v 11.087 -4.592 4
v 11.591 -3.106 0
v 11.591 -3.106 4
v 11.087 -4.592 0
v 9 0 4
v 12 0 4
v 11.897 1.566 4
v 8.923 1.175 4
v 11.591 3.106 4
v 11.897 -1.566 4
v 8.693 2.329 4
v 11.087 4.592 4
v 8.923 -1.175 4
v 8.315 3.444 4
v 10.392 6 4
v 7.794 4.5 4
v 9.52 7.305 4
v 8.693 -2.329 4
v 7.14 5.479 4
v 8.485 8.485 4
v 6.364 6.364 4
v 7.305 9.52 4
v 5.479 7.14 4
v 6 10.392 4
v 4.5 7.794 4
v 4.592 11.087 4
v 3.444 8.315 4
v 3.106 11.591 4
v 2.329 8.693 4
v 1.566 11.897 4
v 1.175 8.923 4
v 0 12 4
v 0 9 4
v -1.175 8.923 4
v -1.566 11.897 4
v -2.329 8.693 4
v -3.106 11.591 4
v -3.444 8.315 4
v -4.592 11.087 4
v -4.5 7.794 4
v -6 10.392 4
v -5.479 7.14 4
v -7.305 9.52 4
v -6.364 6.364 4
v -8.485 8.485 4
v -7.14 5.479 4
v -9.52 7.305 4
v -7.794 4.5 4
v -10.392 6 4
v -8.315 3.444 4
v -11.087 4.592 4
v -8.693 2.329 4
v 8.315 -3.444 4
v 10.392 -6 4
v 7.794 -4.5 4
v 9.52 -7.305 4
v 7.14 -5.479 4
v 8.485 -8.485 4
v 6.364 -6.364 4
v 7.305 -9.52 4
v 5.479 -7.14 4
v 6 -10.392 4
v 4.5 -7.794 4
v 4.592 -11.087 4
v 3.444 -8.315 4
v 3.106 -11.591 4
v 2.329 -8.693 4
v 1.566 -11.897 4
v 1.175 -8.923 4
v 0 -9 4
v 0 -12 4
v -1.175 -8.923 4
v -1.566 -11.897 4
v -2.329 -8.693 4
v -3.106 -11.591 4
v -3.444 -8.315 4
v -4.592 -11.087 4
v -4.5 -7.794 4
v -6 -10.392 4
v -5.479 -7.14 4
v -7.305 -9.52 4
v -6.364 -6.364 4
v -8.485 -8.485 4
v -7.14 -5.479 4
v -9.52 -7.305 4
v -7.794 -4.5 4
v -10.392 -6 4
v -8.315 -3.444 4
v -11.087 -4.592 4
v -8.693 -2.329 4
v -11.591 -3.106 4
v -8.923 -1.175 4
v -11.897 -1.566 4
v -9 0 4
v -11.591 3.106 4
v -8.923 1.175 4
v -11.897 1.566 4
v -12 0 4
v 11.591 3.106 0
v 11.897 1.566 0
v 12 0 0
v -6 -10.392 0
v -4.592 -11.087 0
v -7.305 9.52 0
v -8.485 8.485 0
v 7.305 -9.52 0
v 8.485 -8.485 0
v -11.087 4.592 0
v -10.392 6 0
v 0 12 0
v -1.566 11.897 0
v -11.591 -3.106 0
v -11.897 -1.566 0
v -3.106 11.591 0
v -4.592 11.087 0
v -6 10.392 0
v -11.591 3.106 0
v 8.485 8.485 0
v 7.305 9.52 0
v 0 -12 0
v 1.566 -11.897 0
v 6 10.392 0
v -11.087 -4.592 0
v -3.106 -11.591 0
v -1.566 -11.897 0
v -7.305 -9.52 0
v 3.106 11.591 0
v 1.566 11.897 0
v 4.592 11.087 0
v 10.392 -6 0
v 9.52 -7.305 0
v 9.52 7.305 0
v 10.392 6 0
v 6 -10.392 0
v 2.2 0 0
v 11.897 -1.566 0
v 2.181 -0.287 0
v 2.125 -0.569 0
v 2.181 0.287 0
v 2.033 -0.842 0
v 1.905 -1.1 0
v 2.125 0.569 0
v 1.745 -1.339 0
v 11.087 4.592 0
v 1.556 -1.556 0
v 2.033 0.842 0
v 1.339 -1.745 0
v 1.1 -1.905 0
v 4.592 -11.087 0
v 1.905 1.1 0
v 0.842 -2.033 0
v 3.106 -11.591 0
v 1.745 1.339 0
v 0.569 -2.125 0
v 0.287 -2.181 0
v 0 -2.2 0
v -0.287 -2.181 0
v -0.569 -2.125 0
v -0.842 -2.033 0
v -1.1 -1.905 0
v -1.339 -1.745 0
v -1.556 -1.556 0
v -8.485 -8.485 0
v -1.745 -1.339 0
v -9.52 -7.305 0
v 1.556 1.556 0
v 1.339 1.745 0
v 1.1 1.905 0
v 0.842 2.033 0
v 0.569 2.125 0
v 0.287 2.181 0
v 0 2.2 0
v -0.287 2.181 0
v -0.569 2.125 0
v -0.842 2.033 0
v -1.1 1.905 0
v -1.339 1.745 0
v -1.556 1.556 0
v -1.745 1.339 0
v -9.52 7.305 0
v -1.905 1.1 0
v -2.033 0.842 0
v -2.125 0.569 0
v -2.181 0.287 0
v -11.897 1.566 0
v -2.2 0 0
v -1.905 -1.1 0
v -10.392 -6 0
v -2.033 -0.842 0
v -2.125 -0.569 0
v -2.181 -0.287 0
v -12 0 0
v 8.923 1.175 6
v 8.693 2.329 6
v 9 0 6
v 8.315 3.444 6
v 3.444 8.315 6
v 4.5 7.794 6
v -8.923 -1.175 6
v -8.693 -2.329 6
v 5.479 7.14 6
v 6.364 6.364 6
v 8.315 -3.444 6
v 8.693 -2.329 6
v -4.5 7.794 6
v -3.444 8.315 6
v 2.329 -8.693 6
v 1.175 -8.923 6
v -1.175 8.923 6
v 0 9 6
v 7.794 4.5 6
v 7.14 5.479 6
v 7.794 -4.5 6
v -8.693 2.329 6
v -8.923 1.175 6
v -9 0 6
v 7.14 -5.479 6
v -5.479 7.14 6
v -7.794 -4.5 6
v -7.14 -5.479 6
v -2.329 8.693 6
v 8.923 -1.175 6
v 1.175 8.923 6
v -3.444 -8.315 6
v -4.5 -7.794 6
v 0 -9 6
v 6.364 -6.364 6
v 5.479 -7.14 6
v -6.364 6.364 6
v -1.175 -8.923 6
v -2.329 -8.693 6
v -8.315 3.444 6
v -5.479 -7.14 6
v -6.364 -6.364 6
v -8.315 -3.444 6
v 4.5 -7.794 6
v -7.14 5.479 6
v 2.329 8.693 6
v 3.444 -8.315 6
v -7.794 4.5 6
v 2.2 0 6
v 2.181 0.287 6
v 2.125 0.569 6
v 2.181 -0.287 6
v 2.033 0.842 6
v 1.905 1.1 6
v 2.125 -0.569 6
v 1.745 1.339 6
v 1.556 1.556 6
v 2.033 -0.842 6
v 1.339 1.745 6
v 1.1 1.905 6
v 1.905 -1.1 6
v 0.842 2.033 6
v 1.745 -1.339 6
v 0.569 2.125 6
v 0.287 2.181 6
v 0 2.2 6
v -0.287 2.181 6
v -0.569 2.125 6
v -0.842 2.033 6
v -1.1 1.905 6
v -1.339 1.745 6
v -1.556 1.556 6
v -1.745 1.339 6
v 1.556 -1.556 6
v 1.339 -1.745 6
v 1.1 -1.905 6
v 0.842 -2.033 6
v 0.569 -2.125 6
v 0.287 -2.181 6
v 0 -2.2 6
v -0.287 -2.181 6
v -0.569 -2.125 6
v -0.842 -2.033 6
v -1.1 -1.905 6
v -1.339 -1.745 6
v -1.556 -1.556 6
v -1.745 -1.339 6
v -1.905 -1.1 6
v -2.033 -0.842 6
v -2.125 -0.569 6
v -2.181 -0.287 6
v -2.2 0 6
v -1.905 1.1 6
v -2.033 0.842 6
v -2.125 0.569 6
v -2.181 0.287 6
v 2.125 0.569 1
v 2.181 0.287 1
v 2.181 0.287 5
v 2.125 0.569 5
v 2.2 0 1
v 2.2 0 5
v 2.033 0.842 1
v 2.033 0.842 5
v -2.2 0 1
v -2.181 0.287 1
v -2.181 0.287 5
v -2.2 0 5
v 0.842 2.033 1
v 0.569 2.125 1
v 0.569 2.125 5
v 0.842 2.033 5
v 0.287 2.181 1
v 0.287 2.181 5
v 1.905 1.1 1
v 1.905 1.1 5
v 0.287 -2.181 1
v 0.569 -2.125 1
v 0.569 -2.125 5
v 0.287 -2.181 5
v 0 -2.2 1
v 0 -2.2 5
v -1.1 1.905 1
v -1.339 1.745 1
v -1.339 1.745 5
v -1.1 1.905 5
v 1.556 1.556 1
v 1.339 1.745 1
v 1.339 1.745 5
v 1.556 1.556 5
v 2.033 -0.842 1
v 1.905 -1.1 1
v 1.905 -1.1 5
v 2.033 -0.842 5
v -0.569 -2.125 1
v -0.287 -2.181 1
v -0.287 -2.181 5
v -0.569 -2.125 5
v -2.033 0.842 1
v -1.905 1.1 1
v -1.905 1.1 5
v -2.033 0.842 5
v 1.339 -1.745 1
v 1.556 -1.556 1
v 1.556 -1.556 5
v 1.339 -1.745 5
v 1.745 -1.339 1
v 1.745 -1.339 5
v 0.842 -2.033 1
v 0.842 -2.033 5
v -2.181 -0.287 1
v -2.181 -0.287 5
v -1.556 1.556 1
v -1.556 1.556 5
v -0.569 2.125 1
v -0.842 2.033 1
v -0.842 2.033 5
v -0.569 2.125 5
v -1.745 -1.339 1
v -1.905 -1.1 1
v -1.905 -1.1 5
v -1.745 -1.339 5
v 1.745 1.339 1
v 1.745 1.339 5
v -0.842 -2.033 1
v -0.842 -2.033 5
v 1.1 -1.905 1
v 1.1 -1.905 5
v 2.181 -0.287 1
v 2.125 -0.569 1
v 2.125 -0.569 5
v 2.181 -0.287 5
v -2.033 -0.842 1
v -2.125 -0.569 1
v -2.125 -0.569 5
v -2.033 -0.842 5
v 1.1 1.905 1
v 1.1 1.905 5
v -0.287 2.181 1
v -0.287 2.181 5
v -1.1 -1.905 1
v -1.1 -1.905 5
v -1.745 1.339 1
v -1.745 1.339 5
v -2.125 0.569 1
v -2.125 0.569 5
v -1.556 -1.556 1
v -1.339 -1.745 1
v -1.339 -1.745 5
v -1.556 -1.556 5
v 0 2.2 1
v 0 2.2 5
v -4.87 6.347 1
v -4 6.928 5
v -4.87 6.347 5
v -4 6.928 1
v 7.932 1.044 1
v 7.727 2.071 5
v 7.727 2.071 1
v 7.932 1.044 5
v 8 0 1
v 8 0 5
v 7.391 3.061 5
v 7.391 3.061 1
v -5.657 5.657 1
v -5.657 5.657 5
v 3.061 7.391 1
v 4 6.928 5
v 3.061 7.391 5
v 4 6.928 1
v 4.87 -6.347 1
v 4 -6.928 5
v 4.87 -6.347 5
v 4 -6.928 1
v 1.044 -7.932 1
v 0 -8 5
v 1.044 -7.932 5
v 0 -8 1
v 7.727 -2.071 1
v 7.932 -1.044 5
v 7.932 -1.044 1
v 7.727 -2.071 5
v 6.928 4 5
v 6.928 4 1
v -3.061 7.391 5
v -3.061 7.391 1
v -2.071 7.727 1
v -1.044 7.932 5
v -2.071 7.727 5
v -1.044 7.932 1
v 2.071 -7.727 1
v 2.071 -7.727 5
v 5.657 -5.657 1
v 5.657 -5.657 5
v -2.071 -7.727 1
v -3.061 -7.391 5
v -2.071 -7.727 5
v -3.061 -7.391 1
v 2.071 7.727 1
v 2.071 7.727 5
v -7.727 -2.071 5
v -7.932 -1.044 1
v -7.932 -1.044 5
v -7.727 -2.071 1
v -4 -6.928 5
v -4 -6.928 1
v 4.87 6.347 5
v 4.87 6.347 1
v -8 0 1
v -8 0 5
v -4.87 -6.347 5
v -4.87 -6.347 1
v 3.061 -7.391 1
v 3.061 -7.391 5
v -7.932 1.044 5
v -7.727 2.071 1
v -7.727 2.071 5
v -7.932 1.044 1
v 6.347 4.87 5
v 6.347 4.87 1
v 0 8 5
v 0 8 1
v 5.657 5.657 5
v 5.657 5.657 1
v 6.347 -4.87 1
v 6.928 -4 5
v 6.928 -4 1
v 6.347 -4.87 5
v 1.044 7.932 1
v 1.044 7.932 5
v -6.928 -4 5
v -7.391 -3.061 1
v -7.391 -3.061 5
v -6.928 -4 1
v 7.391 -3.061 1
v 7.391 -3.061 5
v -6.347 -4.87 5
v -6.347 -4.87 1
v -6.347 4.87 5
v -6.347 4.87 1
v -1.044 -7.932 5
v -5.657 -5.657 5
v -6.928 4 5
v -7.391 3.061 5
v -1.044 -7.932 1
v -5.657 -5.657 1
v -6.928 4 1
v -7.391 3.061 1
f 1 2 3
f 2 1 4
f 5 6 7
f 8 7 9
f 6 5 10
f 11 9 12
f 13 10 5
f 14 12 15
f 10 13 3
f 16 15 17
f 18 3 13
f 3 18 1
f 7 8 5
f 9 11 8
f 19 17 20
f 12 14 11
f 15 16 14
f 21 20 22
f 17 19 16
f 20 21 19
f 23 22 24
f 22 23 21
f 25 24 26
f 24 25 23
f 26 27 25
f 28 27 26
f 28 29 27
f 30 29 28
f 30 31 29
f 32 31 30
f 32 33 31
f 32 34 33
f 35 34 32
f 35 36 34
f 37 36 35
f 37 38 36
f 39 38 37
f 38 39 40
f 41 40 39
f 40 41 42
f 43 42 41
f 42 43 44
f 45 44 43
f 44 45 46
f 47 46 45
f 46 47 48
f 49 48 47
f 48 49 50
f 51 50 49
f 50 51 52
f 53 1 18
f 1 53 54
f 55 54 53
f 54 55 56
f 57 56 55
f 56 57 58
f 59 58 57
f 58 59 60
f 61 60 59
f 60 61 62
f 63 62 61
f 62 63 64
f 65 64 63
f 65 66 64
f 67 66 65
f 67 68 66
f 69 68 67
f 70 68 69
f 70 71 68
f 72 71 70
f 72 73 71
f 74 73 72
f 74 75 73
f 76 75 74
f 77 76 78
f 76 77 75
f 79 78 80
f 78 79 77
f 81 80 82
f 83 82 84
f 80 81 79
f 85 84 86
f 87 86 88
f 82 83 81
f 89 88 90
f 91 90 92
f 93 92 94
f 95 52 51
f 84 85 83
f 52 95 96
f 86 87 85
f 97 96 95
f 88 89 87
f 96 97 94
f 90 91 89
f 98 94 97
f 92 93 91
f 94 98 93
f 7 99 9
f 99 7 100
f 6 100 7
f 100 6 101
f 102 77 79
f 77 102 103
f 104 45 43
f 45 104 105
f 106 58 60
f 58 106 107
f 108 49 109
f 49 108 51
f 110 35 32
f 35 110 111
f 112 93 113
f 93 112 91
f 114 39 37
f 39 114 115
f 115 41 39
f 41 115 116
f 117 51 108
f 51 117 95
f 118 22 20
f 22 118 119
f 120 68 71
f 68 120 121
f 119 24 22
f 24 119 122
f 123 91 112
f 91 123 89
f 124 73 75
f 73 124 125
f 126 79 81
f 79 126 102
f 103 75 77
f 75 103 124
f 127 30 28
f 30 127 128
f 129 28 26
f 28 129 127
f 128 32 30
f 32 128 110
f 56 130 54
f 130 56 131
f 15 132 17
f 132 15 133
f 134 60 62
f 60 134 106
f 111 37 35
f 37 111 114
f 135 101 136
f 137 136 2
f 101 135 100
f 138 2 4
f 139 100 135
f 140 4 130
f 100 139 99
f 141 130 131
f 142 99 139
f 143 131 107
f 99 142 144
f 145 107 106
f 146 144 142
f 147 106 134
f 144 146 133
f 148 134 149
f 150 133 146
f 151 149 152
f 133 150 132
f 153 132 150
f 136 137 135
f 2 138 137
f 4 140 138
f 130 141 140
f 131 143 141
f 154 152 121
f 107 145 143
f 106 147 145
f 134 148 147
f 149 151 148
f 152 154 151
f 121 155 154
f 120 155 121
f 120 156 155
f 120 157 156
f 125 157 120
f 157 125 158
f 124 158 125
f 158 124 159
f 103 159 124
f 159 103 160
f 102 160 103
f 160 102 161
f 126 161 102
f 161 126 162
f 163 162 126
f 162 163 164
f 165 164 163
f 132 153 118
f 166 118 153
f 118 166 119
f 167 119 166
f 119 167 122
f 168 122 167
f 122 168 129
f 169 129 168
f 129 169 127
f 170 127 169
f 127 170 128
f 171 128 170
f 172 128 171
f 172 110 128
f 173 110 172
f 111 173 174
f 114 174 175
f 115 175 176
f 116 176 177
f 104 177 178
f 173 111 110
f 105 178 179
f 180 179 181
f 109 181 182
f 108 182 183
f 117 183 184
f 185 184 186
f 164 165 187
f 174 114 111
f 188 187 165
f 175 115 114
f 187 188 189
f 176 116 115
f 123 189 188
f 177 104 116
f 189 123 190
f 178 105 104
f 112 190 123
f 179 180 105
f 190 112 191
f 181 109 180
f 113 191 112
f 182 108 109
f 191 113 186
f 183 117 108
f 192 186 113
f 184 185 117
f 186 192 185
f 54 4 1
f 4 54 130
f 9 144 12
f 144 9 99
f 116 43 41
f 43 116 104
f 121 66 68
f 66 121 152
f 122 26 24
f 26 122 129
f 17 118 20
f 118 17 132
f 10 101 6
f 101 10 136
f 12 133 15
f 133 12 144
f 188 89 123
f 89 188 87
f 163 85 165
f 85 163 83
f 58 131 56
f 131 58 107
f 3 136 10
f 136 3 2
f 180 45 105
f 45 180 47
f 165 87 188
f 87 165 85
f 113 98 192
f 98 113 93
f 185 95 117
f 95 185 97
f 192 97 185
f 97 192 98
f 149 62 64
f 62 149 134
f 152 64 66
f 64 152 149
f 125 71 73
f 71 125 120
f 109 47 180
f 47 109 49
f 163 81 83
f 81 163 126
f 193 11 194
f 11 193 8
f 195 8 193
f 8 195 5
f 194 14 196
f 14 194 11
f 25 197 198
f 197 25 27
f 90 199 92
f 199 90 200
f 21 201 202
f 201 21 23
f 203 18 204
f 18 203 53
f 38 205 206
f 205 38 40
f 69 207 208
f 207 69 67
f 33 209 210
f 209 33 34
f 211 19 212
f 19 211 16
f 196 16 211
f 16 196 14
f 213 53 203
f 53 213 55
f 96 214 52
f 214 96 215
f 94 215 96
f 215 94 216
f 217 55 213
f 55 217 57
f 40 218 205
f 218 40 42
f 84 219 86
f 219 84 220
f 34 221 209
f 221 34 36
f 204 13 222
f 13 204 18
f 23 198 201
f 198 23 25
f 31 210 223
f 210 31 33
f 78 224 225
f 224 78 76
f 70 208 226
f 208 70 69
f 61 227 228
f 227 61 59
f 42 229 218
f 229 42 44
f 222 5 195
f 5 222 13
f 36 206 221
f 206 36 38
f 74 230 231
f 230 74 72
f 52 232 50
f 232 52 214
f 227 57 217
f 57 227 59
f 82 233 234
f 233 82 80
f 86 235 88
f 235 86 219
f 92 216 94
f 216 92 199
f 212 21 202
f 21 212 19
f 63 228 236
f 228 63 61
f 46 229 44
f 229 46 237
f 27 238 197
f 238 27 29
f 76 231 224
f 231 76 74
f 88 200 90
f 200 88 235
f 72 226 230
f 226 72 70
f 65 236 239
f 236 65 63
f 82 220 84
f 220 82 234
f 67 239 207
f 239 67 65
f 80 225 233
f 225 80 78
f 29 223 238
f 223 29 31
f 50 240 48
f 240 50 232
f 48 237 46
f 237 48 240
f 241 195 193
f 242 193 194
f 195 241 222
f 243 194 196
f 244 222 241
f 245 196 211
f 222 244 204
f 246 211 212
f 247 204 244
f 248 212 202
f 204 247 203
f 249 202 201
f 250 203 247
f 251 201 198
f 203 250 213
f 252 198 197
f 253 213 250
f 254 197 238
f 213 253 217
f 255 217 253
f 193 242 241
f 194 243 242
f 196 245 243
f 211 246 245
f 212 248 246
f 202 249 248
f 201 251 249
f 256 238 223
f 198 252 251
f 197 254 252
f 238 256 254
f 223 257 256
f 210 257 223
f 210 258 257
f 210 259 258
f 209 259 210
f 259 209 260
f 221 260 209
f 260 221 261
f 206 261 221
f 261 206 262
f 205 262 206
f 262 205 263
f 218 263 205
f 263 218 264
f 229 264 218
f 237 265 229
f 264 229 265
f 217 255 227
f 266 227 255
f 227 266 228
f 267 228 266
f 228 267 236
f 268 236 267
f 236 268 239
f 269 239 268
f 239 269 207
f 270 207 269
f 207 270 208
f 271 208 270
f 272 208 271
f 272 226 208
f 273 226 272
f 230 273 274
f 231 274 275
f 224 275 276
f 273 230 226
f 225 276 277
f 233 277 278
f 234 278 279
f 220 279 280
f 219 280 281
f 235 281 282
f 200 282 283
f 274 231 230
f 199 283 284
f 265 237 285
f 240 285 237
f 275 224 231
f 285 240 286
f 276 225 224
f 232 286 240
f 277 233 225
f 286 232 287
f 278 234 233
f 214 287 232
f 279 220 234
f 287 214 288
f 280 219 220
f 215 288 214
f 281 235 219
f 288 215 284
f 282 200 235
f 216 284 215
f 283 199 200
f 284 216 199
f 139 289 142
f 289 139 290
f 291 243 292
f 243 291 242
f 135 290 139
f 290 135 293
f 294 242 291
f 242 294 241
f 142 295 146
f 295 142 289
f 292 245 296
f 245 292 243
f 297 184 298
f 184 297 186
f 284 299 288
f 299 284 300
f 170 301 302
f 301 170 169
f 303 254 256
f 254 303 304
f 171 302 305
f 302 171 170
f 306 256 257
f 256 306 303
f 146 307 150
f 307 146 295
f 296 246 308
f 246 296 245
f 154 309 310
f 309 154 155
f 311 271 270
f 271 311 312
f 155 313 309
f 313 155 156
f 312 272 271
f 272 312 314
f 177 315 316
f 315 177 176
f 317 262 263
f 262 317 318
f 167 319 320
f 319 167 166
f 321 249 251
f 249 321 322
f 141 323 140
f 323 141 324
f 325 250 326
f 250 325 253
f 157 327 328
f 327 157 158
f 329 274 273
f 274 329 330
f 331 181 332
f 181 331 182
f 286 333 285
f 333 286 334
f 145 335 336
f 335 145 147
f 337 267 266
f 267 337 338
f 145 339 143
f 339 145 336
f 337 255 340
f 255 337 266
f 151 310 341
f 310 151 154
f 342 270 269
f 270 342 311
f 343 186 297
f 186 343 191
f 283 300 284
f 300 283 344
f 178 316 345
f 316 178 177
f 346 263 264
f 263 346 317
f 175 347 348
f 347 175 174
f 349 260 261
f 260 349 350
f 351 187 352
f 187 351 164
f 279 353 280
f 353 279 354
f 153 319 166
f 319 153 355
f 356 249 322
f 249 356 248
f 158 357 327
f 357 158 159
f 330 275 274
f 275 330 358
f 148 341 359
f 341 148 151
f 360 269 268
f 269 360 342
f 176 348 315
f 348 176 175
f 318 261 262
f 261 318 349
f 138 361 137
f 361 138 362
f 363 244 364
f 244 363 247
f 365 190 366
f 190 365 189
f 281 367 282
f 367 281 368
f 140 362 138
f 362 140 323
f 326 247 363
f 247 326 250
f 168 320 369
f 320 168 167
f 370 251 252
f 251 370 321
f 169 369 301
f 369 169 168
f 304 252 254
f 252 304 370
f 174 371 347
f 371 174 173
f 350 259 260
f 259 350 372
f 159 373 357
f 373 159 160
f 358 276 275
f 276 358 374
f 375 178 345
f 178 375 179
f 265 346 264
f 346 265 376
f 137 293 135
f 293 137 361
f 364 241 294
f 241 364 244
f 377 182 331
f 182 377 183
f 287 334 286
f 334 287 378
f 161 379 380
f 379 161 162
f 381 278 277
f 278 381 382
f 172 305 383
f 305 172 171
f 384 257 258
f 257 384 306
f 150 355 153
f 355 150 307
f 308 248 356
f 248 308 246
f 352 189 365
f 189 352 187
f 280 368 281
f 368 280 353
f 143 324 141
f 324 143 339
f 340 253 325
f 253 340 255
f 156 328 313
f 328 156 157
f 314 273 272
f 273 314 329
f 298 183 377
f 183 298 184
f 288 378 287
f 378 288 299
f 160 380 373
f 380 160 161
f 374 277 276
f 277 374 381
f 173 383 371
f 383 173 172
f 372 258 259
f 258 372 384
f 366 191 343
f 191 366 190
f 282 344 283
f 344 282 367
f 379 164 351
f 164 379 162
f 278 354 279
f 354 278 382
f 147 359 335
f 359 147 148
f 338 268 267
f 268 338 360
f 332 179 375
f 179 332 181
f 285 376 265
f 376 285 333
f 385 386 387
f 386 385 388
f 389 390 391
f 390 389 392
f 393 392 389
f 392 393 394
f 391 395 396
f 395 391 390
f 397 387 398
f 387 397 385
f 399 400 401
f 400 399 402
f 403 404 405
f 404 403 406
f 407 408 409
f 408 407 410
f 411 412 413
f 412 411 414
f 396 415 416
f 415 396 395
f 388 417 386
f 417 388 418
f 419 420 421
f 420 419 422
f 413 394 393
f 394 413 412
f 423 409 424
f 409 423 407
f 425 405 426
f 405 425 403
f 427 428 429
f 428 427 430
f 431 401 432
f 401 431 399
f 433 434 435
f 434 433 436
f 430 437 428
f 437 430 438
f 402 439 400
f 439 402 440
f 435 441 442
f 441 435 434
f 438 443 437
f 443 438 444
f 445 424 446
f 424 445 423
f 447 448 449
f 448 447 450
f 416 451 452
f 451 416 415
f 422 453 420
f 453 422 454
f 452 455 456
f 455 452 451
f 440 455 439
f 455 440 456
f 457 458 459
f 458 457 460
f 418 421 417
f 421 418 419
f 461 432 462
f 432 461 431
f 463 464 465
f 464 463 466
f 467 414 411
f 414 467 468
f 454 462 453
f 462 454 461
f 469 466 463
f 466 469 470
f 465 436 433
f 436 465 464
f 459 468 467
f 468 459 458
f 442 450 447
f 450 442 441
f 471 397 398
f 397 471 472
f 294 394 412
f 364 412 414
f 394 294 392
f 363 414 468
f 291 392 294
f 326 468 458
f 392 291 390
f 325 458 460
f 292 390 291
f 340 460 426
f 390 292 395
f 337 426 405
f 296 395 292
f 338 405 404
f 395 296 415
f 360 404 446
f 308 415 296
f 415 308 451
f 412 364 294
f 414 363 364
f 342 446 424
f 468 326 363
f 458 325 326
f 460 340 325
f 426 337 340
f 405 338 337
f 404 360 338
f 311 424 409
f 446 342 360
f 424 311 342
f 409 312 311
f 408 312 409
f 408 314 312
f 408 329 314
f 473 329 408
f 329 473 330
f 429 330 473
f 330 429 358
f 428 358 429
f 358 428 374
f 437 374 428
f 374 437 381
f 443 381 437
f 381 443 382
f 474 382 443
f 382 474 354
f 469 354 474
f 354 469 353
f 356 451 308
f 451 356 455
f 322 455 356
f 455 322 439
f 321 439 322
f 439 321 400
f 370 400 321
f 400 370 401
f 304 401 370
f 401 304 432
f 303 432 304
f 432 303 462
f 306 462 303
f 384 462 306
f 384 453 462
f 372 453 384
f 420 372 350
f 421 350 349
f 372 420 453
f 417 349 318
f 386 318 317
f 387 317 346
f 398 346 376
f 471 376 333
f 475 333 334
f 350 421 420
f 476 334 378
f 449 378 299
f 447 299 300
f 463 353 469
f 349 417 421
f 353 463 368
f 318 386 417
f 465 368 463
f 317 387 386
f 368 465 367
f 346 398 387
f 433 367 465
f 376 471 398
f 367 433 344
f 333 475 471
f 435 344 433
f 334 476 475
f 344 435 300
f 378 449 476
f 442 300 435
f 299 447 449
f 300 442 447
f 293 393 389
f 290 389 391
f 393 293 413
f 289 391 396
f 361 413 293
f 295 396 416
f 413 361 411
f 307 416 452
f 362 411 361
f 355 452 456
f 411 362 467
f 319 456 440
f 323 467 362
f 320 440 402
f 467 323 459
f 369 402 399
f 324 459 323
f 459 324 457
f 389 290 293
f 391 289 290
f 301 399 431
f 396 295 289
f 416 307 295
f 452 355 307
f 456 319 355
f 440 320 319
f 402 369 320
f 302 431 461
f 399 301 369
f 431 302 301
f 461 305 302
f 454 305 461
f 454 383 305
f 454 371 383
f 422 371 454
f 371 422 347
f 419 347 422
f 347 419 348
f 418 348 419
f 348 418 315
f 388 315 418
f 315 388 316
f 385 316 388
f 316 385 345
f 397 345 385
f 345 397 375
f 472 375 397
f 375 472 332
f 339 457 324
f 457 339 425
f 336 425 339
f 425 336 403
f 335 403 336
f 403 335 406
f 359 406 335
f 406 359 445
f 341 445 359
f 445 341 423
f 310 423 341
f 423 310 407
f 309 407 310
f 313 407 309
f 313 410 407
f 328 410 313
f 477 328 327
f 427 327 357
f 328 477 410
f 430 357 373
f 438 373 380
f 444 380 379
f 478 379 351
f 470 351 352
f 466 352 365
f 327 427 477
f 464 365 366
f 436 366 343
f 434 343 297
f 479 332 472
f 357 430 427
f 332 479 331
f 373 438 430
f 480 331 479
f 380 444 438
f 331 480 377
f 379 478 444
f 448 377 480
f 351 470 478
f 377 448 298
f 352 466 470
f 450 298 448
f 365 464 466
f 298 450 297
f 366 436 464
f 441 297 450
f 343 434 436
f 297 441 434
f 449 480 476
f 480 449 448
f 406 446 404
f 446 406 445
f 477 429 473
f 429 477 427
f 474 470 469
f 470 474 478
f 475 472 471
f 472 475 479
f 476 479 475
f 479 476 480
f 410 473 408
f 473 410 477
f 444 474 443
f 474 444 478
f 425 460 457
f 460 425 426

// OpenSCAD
// SG90 SOUL Modules v0.1
// Interchangeable lightweight modules for the SG90 hardware capsule top socket.
$fn=48;
mode="plate"; // plate, gemini, claude, openai, grok, clawd, openclaw
module soul_adapter_base(){
  difference(){
    union(){cylinder(h=4,r=12);translate([0,0,4])cylinder(h=2,r=9);} // mates Ø24/Ø16 socket reference
    translate([0,0,-1])cylinder(h=8,r=2.2); // SG90 horn screw access
    translate([0,0,1])cylinder(h=4,r=8); // horn clearance cavity
  }
}
module fin(points,h=18,thick=2){linear_extrude(height=thick)polygon(points);}
module gemini(){soul_adapter_base();color("cyan"){translate([-5,-1,6])fin([[0,8],[4,0],[0,-8],[-4,0]],22,2);translate([5,1,6])fin([[0,8],[4,0],[0,-8],[-4,0]],22,2);}}
module claude(){soul_adapter_base();color("orange")translate([-5,-2,6])minkowski(){cube([10,4,22]);sphere(1.5);}}
module openai(){soul_adapter_base();color("white")for(a=[0:60:300])rotate([0,0,a])translate([6,0,7])rotate([90,0,0])cylinder(h=3,r=5,center=true);}
module grok(){soul_adapter_base();color("yellow")translate([-3,-1,6])fin([[-3,13],[5,2],[1,2],[6,-12],[-6,-1],[-1,-1]],24,2.5);}
module clawd(){soul_adapter_base();color("#8b5cf6"){translate([-5,0,7])rotate([0,0,22])cube([3,16,16],center=true);translate([5,0,7])rotate([0,0,-22])cube([3,16,16],center=true);}}
module openclaw(){soul_adapter_base();color("#22d3ee")translate([0,0,13])cube([16,5,12],center=true);color("black")translate([-4,-3,16])sphere(1.2);color("black")translate([4,-3,16])sphere(1.2);}
if(mode=="plate")soul_adapter_base();
if(mode=="gemini")gemini(); if(mode=="claude")claude(); if(mode=="openai")openai(); if(mode=="grok")grok(); if(mode=="clawd")clawd(); if(mode=="openclaw")openclaw();
